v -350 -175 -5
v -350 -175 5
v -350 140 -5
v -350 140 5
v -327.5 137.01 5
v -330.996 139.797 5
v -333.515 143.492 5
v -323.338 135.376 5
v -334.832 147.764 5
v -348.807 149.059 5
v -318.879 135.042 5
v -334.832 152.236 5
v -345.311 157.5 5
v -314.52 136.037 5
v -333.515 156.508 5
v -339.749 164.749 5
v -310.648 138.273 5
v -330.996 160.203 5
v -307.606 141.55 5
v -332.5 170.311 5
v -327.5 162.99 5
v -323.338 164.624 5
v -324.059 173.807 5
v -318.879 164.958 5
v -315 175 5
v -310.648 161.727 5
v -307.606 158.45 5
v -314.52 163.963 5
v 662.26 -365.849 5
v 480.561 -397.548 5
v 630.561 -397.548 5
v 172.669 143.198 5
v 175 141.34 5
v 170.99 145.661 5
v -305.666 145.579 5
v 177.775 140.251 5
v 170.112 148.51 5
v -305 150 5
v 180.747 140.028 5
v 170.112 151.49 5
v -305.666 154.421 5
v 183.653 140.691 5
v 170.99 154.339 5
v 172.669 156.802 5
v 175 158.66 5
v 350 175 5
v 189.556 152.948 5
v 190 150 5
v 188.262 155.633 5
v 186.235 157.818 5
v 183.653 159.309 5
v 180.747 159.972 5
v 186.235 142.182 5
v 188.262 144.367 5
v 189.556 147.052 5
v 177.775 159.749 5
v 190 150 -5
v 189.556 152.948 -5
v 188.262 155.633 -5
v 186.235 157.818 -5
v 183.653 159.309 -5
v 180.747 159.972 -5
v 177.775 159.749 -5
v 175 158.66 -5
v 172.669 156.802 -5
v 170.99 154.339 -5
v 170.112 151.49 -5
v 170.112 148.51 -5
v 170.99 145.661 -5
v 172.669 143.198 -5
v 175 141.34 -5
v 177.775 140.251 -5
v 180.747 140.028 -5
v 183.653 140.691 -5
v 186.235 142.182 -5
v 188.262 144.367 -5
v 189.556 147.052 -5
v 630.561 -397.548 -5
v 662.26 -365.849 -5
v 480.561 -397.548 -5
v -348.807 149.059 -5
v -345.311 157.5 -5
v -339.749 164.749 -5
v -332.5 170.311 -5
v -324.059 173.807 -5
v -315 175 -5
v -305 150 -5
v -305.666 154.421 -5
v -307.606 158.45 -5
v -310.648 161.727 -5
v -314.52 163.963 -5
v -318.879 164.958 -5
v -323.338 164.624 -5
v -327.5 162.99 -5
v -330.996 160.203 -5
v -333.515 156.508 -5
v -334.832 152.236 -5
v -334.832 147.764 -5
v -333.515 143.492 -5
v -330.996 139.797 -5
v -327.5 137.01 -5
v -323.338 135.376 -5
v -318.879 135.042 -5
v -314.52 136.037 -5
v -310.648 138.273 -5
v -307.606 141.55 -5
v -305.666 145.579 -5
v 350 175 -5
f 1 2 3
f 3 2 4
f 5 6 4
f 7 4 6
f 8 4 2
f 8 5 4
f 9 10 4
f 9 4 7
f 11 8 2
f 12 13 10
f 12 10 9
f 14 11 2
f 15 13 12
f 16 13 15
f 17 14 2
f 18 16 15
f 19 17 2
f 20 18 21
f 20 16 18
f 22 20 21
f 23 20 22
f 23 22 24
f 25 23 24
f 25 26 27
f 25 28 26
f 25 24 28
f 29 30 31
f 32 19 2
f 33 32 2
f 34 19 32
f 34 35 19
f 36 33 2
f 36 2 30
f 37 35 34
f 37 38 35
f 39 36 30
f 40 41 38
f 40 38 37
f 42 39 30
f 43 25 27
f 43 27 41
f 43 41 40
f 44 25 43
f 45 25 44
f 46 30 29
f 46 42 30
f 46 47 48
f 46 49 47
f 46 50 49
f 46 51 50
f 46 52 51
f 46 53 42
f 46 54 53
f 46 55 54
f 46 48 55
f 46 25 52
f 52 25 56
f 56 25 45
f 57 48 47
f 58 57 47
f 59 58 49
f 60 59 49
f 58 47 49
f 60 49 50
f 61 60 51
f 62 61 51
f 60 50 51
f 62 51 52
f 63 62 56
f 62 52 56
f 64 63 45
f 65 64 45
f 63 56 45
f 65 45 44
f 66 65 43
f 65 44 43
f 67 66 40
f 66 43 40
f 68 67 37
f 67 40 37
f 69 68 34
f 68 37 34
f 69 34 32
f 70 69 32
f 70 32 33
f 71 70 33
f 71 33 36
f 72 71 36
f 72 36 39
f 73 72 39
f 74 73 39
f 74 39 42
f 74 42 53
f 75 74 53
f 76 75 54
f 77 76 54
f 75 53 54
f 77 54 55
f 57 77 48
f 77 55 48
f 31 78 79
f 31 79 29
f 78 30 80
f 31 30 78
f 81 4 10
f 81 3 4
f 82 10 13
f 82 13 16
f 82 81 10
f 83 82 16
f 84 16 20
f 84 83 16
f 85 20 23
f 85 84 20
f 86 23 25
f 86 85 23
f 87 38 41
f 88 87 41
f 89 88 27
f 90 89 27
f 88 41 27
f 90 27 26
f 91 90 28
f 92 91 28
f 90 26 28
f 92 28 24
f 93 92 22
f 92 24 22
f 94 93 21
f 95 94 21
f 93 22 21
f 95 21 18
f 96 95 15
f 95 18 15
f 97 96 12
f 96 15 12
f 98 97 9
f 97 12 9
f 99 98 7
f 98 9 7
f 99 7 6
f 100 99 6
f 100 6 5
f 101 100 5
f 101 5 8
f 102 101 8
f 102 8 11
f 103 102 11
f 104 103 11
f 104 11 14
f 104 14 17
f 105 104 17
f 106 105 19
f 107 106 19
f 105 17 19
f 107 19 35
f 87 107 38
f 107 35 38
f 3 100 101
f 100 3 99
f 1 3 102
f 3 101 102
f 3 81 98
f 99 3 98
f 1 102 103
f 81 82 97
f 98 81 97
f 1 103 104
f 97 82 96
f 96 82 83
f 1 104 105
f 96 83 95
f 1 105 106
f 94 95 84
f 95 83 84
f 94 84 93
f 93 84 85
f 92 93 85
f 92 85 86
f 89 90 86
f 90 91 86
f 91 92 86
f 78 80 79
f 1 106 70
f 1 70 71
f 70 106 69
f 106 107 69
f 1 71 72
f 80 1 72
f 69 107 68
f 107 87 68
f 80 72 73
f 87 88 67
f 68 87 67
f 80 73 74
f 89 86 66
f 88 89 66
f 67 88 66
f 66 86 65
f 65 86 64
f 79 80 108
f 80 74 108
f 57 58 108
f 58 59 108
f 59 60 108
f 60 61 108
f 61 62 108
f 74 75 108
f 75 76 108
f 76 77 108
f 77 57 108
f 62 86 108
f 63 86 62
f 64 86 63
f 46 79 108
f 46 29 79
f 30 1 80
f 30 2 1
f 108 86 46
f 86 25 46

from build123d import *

# Parameters (mm, degrees)
SKETCH1_W           = 700
SKETCH1_H           = 350
BOSS_EXTRUDE2_DEPTH = 5
SKETCH2_R           = 15
SKETCH2_R_2         = 10
CUT_EXTRUDE1_DEPTH  = 10
FILLET1_R           = 35
CHAMFER1_SIZE       = 50
CHAMFER1_SIZE2      = 36.602540378


with BuildPart() as part:
    # Sketch1 → Boss-Extrude2 (new, symmetric)
    with BuildSketch(Plane.XY):
        Polygon((350, -175), (-350, -175), (480.560796608, -397.548094716), (680.560796608, -397.548094716), (350, 175), align=None)
        Rectangle(SKETCH1_W, SKETCH1_H)
    extrude(amount=BOSS_EXTRUDE2_DEPTH, both=True)

    # Sketch2 → Cut-Extrude1 (cut)
    with BuildSketch(Plane.XY.offset(5)):
        with Locations((-320, 150)):
            Circle(SKETCH2_R)
        with Locations((180, 150)):
            Circle(SKETCH2_R_2)
    extrude(amount=-CUT_EXTRUDE1_DEPTH, mode=Mode.SUBTRACT)

    # Fillet1
    fillet1_edges = [part.edges().sort_by_distance(p)[0] for p in [
        (-350, 175, 0),
    ]]
    fillet(fillet1_edges, radius=FILLET1_R)

    # Chamfer1
    chamfer1_edges = [part.edges().sort_by_distance(p)[0] for p in [
        (680.560796608, -397.548094716, 0),
    ]]
    chamfer1_side = [part.faces().sort_by_distance(p)[0] for p in [
        (580.560796608, -397.548094716, 0),
    ]]
    chamfer(chamfer1_edges, length=CHAMFER1_SIZE, length2=CHAMFER1_SIZE2, reference=chamfer1_side[0])


solid = part.part
